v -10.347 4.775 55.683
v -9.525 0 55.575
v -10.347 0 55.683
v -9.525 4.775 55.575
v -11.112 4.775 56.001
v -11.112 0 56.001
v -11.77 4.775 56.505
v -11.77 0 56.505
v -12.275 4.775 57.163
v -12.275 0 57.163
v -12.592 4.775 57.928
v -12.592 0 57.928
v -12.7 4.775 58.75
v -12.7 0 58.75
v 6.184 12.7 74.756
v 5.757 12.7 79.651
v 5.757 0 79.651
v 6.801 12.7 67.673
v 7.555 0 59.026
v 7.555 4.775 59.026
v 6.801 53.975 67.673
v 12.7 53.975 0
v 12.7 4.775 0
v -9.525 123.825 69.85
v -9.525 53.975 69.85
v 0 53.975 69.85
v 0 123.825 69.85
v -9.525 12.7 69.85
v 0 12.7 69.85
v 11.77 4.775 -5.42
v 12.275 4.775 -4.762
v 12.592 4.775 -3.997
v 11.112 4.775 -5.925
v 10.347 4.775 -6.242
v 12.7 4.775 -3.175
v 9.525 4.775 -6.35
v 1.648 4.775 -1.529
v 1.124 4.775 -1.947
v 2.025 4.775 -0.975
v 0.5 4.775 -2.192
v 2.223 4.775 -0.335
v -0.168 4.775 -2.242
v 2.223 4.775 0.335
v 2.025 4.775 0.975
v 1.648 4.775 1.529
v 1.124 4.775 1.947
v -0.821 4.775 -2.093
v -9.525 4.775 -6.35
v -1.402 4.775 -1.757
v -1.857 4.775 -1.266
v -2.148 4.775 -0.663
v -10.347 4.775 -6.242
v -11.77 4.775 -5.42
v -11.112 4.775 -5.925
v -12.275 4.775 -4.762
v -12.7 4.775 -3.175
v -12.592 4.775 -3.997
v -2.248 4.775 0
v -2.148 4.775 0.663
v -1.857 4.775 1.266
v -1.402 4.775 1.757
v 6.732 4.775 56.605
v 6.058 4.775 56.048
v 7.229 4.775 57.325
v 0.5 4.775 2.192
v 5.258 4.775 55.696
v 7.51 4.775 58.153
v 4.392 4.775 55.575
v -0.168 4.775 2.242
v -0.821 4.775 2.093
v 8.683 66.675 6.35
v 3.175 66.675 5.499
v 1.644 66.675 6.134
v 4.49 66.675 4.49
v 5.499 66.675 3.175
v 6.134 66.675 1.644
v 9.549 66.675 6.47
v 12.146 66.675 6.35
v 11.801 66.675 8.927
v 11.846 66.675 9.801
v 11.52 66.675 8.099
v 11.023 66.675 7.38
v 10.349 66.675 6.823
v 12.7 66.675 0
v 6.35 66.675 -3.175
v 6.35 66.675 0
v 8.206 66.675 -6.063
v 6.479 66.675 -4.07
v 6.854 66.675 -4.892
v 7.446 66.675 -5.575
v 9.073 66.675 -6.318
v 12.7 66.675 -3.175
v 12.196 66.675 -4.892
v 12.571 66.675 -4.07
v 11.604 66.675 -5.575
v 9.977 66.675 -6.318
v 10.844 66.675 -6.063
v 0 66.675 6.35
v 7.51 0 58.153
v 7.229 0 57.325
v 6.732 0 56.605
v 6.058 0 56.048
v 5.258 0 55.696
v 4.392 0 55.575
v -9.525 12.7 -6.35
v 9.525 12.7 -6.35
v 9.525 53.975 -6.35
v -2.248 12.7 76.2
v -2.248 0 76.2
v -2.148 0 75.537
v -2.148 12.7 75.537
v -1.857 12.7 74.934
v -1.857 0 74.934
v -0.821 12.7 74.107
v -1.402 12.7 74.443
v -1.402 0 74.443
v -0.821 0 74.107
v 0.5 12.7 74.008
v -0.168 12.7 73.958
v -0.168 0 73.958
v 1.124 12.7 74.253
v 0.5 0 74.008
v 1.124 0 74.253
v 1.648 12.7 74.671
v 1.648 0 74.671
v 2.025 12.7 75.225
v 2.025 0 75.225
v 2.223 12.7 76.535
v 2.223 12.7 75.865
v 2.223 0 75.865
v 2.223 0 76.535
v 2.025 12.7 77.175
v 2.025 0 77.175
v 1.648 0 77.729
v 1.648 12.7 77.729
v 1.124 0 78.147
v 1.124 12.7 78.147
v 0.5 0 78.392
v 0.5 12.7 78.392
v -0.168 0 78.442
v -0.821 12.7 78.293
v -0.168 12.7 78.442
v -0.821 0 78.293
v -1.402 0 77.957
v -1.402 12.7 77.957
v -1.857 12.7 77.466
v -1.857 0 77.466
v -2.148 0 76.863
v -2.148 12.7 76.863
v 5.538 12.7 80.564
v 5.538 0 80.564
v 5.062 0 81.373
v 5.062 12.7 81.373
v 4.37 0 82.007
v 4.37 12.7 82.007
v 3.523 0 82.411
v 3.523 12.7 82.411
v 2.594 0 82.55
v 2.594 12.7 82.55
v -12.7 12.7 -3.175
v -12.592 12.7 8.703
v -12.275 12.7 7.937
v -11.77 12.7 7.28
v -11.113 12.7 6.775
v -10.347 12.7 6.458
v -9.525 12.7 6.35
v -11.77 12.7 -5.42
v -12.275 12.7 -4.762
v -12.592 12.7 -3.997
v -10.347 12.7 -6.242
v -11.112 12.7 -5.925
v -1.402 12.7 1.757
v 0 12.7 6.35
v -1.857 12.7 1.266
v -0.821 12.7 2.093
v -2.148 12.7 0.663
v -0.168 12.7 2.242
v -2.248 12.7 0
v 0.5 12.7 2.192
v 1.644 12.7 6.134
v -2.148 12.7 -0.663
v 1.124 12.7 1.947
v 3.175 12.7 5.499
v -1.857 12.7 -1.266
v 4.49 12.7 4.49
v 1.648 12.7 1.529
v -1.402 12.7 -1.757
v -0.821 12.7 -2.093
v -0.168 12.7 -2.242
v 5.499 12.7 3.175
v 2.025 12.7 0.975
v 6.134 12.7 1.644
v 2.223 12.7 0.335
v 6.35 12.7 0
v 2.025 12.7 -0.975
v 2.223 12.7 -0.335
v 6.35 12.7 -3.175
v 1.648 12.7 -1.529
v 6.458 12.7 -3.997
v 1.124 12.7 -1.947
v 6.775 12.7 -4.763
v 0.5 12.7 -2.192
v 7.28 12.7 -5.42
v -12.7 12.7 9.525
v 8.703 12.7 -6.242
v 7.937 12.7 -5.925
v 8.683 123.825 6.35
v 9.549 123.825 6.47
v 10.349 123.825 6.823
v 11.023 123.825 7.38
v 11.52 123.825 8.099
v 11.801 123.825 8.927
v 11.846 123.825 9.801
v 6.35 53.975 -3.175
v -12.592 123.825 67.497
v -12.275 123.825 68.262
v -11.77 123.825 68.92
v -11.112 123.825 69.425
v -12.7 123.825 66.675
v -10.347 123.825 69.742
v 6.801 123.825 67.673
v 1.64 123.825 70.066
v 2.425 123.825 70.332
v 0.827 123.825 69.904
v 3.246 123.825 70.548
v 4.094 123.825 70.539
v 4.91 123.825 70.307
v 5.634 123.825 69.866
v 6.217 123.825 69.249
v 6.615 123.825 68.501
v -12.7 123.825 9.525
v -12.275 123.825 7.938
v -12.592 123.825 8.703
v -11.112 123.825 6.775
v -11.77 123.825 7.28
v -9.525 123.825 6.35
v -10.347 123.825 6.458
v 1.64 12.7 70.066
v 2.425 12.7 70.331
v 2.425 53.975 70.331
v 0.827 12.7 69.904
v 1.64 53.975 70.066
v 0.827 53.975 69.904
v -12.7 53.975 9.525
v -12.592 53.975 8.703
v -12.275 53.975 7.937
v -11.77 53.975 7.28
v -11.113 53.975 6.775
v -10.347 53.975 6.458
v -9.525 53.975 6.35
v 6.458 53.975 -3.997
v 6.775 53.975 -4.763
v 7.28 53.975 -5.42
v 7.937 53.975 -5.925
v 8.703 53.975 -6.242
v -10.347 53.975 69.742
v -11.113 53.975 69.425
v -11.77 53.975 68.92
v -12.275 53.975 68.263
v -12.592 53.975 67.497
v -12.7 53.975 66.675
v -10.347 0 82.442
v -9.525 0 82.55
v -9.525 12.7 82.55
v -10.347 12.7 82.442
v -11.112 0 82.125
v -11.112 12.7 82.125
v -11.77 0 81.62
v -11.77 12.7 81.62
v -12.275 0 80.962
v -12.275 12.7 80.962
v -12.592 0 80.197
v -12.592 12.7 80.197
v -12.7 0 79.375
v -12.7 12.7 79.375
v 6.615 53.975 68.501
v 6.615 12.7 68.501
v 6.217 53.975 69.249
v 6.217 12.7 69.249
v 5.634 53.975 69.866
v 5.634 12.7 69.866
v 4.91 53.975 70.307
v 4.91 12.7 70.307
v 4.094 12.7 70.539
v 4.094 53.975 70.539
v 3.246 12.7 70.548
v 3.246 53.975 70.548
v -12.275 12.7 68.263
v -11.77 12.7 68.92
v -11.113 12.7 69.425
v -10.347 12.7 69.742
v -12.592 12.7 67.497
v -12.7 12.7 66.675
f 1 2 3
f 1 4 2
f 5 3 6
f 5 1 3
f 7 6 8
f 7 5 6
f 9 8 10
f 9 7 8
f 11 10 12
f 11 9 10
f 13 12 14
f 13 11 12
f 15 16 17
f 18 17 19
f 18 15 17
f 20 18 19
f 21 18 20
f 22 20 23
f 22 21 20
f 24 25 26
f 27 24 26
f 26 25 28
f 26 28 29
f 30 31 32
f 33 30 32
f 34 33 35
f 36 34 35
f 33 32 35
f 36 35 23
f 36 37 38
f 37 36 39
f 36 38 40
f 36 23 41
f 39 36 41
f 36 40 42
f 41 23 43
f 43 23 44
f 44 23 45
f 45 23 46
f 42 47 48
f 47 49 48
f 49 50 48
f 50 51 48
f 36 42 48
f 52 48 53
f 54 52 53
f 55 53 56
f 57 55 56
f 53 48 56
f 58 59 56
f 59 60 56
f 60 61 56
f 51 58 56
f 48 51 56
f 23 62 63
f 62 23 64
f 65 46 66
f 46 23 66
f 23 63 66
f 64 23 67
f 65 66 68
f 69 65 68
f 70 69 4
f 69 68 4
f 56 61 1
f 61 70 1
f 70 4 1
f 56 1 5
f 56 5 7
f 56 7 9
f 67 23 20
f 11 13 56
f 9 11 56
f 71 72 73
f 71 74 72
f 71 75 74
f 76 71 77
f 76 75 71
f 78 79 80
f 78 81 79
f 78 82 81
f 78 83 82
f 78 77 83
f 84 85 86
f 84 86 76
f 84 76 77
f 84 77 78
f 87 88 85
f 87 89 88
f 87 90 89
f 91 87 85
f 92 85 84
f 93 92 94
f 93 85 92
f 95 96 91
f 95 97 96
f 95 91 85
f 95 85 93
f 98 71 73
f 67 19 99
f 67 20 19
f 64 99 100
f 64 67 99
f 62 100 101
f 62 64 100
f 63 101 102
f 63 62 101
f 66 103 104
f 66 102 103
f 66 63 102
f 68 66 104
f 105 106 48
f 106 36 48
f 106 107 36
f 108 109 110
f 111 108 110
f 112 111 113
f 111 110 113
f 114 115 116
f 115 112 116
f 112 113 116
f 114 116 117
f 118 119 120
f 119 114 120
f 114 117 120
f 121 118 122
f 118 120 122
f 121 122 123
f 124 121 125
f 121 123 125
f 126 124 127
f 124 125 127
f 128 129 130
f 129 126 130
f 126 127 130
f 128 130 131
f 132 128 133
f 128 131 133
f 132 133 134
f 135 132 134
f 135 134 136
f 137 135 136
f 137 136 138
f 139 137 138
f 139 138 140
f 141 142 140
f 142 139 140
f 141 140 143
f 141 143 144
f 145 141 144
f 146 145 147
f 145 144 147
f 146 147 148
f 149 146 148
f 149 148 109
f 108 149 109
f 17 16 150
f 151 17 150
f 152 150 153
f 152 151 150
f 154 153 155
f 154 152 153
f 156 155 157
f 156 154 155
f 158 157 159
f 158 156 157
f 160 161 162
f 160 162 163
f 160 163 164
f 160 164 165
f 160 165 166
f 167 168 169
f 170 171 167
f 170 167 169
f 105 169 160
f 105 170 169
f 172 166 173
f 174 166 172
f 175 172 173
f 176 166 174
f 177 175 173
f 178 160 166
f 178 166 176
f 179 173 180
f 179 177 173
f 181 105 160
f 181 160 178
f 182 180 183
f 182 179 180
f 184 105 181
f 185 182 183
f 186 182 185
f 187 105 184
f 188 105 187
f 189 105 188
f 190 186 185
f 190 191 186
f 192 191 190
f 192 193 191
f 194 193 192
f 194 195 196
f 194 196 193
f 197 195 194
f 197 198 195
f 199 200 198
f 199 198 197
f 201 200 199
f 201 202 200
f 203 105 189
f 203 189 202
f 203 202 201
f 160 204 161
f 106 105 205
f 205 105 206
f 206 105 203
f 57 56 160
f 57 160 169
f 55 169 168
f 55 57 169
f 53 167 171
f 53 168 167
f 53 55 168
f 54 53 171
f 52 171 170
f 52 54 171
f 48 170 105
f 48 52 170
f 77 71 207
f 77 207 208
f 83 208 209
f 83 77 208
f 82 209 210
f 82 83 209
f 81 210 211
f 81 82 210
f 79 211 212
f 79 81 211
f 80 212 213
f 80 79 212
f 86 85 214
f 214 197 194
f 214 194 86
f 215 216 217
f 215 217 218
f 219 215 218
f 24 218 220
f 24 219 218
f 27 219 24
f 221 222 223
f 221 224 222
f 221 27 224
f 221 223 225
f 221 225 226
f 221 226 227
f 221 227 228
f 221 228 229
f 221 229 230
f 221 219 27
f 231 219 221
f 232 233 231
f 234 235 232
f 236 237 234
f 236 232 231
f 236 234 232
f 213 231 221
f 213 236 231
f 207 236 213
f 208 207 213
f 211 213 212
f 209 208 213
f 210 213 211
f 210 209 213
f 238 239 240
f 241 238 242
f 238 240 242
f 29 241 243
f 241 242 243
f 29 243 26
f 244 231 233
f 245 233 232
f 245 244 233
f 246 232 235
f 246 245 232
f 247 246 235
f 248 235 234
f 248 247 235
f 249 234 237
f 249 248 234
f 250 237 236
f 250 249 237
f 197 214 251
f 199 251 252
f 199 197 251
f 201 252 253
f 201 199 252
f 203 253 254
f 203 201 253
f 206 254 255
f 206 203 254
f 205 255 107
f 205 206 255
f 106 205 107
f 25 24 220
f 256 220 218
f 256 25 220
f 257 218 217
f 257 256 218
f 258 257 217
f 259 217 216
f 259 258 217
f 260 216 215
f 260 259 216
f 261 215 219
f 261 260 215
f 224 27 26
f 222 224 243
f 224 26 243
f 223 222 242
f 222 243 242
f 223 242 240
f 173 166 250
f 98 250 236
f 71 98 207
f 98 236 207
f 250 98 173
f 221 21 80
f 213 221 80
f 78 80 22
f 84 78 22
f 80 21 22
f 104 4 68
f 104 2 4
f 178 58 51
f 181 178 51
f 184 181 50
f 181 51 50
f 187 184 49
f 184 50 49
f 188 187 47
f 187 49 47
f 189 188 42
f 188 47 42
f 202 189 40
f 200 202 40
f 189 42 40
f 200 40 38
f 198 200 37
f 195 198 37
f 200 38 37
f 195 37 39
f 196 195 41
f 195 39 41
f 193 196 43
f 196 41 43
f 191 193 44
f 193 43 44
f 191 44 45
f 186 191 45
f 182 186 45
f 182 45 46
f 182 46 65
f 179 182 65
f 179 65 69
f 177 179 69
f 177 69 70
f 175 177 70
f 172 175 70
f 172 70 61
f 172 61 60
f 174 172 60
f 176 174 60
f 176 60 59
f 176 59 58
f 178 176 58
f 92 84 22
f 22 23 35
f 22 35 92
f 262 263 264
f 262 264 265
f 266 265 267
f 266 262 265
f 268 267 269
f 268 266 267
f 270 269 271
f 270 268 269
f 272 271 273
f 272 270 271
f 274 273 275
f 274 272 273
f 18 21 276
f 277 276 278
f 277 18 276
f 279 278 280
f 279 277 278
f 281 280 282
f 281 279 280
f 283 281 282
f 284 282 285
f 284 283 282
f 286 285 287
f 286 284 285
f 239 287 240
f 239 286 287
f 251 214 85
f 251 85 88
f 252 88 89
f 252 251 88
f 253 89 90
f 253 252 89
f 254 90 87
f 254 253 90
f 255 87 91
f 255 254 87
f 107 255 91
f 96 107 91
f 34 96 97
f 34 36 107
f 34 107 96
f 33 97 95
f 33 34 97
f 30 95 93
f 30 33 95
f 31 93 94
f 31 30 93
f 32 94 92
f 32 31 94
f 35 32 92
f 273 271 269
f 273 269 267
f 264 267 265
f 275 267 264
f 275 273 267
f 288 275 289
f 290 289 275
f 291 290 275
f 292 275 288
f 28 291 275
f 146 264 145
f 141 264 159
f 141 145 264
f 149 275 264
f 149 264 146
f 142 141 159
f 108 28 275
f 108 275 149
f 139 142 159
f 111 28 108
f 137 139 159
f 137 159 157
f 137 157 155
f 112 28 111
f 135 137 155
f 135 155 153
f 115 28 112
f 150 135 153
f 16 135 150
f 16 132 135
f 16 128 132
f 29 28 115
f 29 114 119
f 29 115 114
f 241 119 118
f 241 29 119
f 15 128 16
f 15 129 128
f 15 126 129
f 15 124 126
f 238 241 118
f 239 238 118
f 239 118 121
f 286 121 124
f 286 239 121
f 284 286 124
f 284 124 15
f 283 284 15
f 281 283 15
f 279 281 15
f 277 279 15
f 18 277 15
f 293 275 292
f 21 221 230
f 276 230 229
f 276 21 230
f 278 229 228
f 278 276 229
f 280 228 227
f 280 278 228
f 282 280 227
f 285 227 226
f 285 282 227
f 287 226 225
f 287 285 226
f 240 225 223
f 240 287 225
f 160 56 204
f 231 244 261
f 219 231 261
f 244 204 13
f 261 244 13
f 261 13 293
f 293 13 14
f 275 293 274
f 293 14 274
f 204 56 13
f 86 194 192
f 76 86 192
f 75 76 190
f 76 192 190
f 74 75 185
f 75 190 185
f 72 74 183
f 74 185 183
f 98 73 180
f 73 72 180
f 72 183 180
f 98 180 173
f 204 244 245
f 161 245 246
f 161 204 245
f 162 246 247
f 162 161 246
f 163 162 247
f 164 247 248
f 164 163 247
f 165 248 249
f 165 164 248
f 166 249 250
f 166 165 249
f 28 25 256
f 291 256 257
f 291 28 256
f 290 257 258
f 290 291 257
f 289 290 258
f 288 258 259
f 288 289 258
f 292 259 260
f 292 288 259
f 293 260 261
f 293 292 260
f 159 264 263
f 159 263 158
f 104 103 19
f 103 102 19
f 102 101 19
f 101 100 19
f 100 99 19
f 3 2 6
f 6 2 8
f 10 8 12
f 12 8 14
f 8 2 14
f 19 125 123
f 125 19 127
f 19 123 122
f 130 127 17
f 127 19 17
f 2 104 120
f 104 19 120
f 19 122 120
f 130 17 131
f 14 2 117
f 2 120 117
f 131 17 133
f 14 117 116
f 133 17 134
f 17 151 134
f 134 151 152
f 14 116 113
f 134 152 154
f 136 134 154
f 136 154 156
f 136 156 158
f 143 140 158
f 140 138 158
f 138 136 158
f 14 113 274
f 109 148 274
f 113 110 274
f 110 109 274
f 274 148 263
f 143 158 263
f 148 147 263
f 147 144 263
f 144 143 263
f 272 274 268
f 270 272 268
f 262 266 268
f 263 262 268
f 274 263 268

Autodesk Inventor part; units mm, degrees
ref_plane "YZ Plane" through (0, 0, 0) normal (1, 0, 0) x (0, 1, 0)
ref_plane "XZ Plane" through (0, 0, 0) normal (0, 1, 0) x (-1, 0, 0)
ref_plane "XY Plane" through (0, 0, 0) normal (0, 0, 1) x (1, 0, 0)
sketch "Sketch1" plane through (0, 0, 0) normal (0, 1, 0) x (-1, 0, 0)
  circle A0 centre (0, 0) radius 2.2479
  line L0 (0, 0) -> (0, 76.2) construction
  circle A1 centre (0, 76.2) radius 2.2479
  line L1 (9.525, 82.55) -> (-9.525, 82.55)
  line L2 (-12.7, 79.375) -> (-12.7, -3.175)
  line L3 (-9.525, -6.35) -> (9.525, -6.35)
  line L4 (12.7, -3.175) -> (12.7, 79.375)
  line L5 (0, 0) -> (0, 55.5752) construction
  line L6 (12.7, 55.5752) -> (-12.7, 55.5752) construction
  line L7 (12.7, 55.5752) -> (-12.7, 55.5752)
  arc A2 (12.7, 79.375) -> (9.525, 82.55) centre (9.525, 79.375) ccw
  arc A3 (-9.525, 82.55) -> (-12.7, 79.375) centre (-9.525, 79.375) ccw
  arc A4 (9.525, -6.35) -> (12.7, -3.175) centre (9.525, -3.175) ccw
  arc A5 (-12.7, -3.175) -> (-9.525, -6.35) centre (-9.525, -3.175) ccw
  point P0 (-12.7, -6.35)
  point P1 (12.7, -6.35)
  dimension "d0" = 4.4958
  dimension "d1" = 4.4958
  dimension "d2" = 76.2
  dimension "d3" = 25.4
  dimension "d4" = 12.7
  dimension "d5" = 6.35
  dimension "d6" = 6.35
  dimension "d7" = 55.5752
  dimension "d8" = 3.175
extrude "Extrusion1" add sketch "Sketch1" along normal blind 53.975
sketch "Sketch2" plane through (0, 53.975, 0) normal (0, 1, 0) x (1, 0, 0)
  line L0 (12.7, -79.375) -> (12.7, 3.175) projected
  arc A0 (12.7, 3.175) -> (9.525, 6.35) centre (9.525, 3.175) ccw projected
  line L1 (9.525, 6.35) -> (-9.525, 6.35) projected
  arc A1 (-9.525, 6.35) -> (-12.7, 3.175) centre (-9.525, 3.175) ccw projected
  line L2 (-12.7, 3.175) -> (-12.7, -79.375) projected
  arc A2 (-12.7, -79.375) -> (-9.525, -82.55) centre (-9.525, -79.375) ccw projected
  line L3 (-9.525, -82.55) -> (9.525, -82.55) projected
  arc A3 (9.525, -82.55) -> (12.7, -79.375) centre (9.525, -79.375) ccw projected
  circle A4 centre (0, 0) radius 2.2479 projected
  circle A5 centre (0, -76.2) radius 2.2479 projected
  line L4 (5.5044, -82.55) -> (12.7, 0)
  line L5 (12.7, -79.375) -> (12.7, 3.175) projected
  line L6 (-12.7, 0) -> (12.7, 0) construction
  line L7 (2.2479, -76.2) -> (6.0579, -76.2) construction
  line L8 (5.5044, -82.55) -> (12.7, -82.55)
  line L9 (12.7, -82.55) -> (12.7, 0)
  point P0 (12.7, 0)
  dimension "d14" = 3.81
extrude "Extrusion3" cut sketch "Sketch2" against normal through all contours A3 L3 L4 L0
fillet "Fillet2" radius 3.175 1 edges at (5.5044, 26.9875, 82.55)
sketch "Sketch3" plane through (0, 53.975, 0) normal (0, 1, 0) x (1, 0, 0)
  point P0 (0, 0)
extrude "Extrusion4" cut sketch "Sketch1" along normal blind 4.7752 contours L4 A4 L3 A5 L2 L7
fillet "Fillet3" radius 3.175 2 edges at (7.8557, 2.3876, 55.5752) (-12.7, 2.3876, 55.5752)
sketch "Sketch5" plane through (0, 53.975, 0) normal (0, 1, 0) x (1, 0, 0)
  circle A0 centre (0, -76.2) radius 2.2479 projected
  circle A1 centre (0, 0) radius 2.2479 projected
  arc A2 (2.5941, -82.55) -> (5.7571, -79.6507) centre (2.5941, -79.375) ccw projected
  line L0 (5.7571, -79.6507) -> (12.7, 0) projected
  line L1 (12.7, 0) -> (12.7, 3.175) projected
  arc A3 (12.7, 3.175) -> (9.525, 6.35) centre (9.525, 3.175) ccw projected
  line L2 (9.525, 6.35) -> (-9.525, 6.35) projected
  arc A4 (-9.525, 6.35) -> (-12.7, 3.175) centre (-9.525, 3.175) ccw projected
  line L3 (-12.7, 3.175) -> (-12.7, -79.375) projected
  arc A5 (-12.7, -79.375) -> (-9.525, -82.55) centre (-9.525, -79.375) ccw projected
  line L4 (-9.525, -82.55) -> (2.5941, -82.55) projected
  circle A6 centre (0, 0) radius 6.35 construction
  line L5 (6.35, 0) -> (6.35, 6.35)
  line L6 (0, -6.35) -> (-12.7, -6.35)
  arc A7 (0, -6.35) -> (6.35, 0) centre (0, 0) ccw
  line L7 (6.35, 6.35) -> (-12.7, 6.35)
  line L8 (-12.7, 6.35) -> (-12.7, -6.35)
  circle A8 centre (0, -76.2) radius 6.35 construction
  line L9 (0, -69.85) -> (-12.7, -69.85)
  line L10 (6.1837, -74.7564) -> (5.5044, -82.55)
  line L11 (5.5044, -82.55) -> (-12.7, -82.55)
  line L12 (-12.7, -82.55) -> (-12.7, -69.85)
  line L13 (-9.525, -82.55) -> (2.5941, -82.55) projected
  arc A9 (6.1837, -74.7564) -> (0, -69.85) centre (0, -76.2) ccw
  dimension "d21" = 12.7
  dimension "d22" = 12.7
extrude "Extrusion5" cut sketch "Sketch5" against normal blind 41.275 contours L4 A5 L3 L9 A9 L0 A2 | L3 A4 L2 L5 A7 L6
fillet "Fillet4" radius 3.175 1 edges at (6.1837, 33.3375, 74.7564)
fillet "Fillet5" radius 3.175 3 edges at (-12.7, 33.3375, 69.85) (-12.7, 33.3375, 6.35) (6.35, 33.3375, -6.35)
sketch "Sketch6" plane through (0, 53.975, 0) normal (0, 1, 0) x (1, 0, 0)
  arc A0 (12.7, 3.175) -> (6.35, 3.175) centre (9.525, 3.175) ccw projected
  line L0 (6.35, 3.175) -> (6.35, 0) projected
  arc A1 (0, -6.35) -> (6.35, 0) centre (0, 0) ccw projected
  line L1 (0, -6.35) -> (-9.525, -6.35) projected
  arc A2 (-9.525, -6.35) -> (-12.7, -9.525) centre (-9.525, -9.525) ccw projected
  line L2 (-12.7, -9.525) -> (-12.7, -66.675) projected
  arc A3 (-12.7, -66.675) -> (-9.525, -69.85) centre (-9.525, -66.675) ccw projected
  line L3 (-9.525, -69.85) -> (0, -69.85) projected
  arc A4 (2.4254, -70.3315) -> (0, -69.85) centre (0, -76.2) ccw projected
  arc A5 (2.4254, -70.3315) -> (6.8012, -67.6729) centre (3.6382, -67.3972) ccw projected
  line L4 (6.8012, -67.6729) -> (12.7, 0) projected
  line L5 (12.7, 0) -> (12.7, 3.175) projected
  point P0 (0, 0)
extrude "Extrusion6" add sketch "Sketch6" along normal blind 69.85
sketch "Sketch7" plane through (0, 123.825, 0) normal (0, 1, 0) x (1, 0, 0)
  line L0 (6.8012, -67.6729) -> (12.7, 0) projected
  line L1 (12.7, 0) -> (12.7, 3.175) projected
  arc A0 (12.7, 3.175) -> (6.35, 3.175) centre (9.525, 3.175) ccw projected
  line L2 (6.35, 3.175) -> (6.35, 0) projected
  arc A1 (0, -6.35) -> (6.35, 0) centre (0, 0) ccw projected
  line L3 (0, -6.35) -> (-9.525, -6.35) projected
  arc A2 (-9.525, -6.35) -> (-12.7, -9.525) centre (-9.525, -9.525) ccw projected
  line L4 (-12.7, -9.525) -> (-12.7, -66.675) projected
  arc A3 (-12.7, -66.675) -> (-9.525, -69.85) centre (-9.525, -66.675) ccw projected
  line L5 (-9.525, -69.85) -> (0, -69.85) projected
  arc A4 (2.4254, -70.3315) -> (0, -69.85) centre (0, -76.2) ccw projected
  arc A5 (2.4254, -70.3315) -> (6.8012, -67.6729) centre (3.6382, -67.3972) ccw projected
  line L6 (6.35, 0) -> (6.35, 3.175)
  arc A6 (9.525, 6.35) -> (6.35, 3.175) centre (9.525, 3.175) ccw projected
  line L7 (12.7, 0) -> (12.7, 3.175)
  arc A7 (12.7, 3.175) -> (6.35, 3.175) centre (9.525, 3.175) ccw
  line L8 (0, -6.35) -> (12.1465, -6.35)
  arc A8 (0, -6.35) -> (6.35, 0) centre (0, 0) ccw projected
  line L9 (12.1465, -6.35) -> (12.7, 0)
  arc A9 (0, -6.35) -> (6.35, 0) centre (0, 0) ccw
  point P0 (0, 0)
extrude "Extrusion8" cut sketch "Sketch7" against normal blind 57.15 contours L8 A1 L2 A0 L1 L0
fillet "Fillet6" radius 3.175 1 edges at (12.1465, 95.25, 6.35)
properties part number "INtk_016_PelletDeflector1" material "PC/ABS Plastic"
